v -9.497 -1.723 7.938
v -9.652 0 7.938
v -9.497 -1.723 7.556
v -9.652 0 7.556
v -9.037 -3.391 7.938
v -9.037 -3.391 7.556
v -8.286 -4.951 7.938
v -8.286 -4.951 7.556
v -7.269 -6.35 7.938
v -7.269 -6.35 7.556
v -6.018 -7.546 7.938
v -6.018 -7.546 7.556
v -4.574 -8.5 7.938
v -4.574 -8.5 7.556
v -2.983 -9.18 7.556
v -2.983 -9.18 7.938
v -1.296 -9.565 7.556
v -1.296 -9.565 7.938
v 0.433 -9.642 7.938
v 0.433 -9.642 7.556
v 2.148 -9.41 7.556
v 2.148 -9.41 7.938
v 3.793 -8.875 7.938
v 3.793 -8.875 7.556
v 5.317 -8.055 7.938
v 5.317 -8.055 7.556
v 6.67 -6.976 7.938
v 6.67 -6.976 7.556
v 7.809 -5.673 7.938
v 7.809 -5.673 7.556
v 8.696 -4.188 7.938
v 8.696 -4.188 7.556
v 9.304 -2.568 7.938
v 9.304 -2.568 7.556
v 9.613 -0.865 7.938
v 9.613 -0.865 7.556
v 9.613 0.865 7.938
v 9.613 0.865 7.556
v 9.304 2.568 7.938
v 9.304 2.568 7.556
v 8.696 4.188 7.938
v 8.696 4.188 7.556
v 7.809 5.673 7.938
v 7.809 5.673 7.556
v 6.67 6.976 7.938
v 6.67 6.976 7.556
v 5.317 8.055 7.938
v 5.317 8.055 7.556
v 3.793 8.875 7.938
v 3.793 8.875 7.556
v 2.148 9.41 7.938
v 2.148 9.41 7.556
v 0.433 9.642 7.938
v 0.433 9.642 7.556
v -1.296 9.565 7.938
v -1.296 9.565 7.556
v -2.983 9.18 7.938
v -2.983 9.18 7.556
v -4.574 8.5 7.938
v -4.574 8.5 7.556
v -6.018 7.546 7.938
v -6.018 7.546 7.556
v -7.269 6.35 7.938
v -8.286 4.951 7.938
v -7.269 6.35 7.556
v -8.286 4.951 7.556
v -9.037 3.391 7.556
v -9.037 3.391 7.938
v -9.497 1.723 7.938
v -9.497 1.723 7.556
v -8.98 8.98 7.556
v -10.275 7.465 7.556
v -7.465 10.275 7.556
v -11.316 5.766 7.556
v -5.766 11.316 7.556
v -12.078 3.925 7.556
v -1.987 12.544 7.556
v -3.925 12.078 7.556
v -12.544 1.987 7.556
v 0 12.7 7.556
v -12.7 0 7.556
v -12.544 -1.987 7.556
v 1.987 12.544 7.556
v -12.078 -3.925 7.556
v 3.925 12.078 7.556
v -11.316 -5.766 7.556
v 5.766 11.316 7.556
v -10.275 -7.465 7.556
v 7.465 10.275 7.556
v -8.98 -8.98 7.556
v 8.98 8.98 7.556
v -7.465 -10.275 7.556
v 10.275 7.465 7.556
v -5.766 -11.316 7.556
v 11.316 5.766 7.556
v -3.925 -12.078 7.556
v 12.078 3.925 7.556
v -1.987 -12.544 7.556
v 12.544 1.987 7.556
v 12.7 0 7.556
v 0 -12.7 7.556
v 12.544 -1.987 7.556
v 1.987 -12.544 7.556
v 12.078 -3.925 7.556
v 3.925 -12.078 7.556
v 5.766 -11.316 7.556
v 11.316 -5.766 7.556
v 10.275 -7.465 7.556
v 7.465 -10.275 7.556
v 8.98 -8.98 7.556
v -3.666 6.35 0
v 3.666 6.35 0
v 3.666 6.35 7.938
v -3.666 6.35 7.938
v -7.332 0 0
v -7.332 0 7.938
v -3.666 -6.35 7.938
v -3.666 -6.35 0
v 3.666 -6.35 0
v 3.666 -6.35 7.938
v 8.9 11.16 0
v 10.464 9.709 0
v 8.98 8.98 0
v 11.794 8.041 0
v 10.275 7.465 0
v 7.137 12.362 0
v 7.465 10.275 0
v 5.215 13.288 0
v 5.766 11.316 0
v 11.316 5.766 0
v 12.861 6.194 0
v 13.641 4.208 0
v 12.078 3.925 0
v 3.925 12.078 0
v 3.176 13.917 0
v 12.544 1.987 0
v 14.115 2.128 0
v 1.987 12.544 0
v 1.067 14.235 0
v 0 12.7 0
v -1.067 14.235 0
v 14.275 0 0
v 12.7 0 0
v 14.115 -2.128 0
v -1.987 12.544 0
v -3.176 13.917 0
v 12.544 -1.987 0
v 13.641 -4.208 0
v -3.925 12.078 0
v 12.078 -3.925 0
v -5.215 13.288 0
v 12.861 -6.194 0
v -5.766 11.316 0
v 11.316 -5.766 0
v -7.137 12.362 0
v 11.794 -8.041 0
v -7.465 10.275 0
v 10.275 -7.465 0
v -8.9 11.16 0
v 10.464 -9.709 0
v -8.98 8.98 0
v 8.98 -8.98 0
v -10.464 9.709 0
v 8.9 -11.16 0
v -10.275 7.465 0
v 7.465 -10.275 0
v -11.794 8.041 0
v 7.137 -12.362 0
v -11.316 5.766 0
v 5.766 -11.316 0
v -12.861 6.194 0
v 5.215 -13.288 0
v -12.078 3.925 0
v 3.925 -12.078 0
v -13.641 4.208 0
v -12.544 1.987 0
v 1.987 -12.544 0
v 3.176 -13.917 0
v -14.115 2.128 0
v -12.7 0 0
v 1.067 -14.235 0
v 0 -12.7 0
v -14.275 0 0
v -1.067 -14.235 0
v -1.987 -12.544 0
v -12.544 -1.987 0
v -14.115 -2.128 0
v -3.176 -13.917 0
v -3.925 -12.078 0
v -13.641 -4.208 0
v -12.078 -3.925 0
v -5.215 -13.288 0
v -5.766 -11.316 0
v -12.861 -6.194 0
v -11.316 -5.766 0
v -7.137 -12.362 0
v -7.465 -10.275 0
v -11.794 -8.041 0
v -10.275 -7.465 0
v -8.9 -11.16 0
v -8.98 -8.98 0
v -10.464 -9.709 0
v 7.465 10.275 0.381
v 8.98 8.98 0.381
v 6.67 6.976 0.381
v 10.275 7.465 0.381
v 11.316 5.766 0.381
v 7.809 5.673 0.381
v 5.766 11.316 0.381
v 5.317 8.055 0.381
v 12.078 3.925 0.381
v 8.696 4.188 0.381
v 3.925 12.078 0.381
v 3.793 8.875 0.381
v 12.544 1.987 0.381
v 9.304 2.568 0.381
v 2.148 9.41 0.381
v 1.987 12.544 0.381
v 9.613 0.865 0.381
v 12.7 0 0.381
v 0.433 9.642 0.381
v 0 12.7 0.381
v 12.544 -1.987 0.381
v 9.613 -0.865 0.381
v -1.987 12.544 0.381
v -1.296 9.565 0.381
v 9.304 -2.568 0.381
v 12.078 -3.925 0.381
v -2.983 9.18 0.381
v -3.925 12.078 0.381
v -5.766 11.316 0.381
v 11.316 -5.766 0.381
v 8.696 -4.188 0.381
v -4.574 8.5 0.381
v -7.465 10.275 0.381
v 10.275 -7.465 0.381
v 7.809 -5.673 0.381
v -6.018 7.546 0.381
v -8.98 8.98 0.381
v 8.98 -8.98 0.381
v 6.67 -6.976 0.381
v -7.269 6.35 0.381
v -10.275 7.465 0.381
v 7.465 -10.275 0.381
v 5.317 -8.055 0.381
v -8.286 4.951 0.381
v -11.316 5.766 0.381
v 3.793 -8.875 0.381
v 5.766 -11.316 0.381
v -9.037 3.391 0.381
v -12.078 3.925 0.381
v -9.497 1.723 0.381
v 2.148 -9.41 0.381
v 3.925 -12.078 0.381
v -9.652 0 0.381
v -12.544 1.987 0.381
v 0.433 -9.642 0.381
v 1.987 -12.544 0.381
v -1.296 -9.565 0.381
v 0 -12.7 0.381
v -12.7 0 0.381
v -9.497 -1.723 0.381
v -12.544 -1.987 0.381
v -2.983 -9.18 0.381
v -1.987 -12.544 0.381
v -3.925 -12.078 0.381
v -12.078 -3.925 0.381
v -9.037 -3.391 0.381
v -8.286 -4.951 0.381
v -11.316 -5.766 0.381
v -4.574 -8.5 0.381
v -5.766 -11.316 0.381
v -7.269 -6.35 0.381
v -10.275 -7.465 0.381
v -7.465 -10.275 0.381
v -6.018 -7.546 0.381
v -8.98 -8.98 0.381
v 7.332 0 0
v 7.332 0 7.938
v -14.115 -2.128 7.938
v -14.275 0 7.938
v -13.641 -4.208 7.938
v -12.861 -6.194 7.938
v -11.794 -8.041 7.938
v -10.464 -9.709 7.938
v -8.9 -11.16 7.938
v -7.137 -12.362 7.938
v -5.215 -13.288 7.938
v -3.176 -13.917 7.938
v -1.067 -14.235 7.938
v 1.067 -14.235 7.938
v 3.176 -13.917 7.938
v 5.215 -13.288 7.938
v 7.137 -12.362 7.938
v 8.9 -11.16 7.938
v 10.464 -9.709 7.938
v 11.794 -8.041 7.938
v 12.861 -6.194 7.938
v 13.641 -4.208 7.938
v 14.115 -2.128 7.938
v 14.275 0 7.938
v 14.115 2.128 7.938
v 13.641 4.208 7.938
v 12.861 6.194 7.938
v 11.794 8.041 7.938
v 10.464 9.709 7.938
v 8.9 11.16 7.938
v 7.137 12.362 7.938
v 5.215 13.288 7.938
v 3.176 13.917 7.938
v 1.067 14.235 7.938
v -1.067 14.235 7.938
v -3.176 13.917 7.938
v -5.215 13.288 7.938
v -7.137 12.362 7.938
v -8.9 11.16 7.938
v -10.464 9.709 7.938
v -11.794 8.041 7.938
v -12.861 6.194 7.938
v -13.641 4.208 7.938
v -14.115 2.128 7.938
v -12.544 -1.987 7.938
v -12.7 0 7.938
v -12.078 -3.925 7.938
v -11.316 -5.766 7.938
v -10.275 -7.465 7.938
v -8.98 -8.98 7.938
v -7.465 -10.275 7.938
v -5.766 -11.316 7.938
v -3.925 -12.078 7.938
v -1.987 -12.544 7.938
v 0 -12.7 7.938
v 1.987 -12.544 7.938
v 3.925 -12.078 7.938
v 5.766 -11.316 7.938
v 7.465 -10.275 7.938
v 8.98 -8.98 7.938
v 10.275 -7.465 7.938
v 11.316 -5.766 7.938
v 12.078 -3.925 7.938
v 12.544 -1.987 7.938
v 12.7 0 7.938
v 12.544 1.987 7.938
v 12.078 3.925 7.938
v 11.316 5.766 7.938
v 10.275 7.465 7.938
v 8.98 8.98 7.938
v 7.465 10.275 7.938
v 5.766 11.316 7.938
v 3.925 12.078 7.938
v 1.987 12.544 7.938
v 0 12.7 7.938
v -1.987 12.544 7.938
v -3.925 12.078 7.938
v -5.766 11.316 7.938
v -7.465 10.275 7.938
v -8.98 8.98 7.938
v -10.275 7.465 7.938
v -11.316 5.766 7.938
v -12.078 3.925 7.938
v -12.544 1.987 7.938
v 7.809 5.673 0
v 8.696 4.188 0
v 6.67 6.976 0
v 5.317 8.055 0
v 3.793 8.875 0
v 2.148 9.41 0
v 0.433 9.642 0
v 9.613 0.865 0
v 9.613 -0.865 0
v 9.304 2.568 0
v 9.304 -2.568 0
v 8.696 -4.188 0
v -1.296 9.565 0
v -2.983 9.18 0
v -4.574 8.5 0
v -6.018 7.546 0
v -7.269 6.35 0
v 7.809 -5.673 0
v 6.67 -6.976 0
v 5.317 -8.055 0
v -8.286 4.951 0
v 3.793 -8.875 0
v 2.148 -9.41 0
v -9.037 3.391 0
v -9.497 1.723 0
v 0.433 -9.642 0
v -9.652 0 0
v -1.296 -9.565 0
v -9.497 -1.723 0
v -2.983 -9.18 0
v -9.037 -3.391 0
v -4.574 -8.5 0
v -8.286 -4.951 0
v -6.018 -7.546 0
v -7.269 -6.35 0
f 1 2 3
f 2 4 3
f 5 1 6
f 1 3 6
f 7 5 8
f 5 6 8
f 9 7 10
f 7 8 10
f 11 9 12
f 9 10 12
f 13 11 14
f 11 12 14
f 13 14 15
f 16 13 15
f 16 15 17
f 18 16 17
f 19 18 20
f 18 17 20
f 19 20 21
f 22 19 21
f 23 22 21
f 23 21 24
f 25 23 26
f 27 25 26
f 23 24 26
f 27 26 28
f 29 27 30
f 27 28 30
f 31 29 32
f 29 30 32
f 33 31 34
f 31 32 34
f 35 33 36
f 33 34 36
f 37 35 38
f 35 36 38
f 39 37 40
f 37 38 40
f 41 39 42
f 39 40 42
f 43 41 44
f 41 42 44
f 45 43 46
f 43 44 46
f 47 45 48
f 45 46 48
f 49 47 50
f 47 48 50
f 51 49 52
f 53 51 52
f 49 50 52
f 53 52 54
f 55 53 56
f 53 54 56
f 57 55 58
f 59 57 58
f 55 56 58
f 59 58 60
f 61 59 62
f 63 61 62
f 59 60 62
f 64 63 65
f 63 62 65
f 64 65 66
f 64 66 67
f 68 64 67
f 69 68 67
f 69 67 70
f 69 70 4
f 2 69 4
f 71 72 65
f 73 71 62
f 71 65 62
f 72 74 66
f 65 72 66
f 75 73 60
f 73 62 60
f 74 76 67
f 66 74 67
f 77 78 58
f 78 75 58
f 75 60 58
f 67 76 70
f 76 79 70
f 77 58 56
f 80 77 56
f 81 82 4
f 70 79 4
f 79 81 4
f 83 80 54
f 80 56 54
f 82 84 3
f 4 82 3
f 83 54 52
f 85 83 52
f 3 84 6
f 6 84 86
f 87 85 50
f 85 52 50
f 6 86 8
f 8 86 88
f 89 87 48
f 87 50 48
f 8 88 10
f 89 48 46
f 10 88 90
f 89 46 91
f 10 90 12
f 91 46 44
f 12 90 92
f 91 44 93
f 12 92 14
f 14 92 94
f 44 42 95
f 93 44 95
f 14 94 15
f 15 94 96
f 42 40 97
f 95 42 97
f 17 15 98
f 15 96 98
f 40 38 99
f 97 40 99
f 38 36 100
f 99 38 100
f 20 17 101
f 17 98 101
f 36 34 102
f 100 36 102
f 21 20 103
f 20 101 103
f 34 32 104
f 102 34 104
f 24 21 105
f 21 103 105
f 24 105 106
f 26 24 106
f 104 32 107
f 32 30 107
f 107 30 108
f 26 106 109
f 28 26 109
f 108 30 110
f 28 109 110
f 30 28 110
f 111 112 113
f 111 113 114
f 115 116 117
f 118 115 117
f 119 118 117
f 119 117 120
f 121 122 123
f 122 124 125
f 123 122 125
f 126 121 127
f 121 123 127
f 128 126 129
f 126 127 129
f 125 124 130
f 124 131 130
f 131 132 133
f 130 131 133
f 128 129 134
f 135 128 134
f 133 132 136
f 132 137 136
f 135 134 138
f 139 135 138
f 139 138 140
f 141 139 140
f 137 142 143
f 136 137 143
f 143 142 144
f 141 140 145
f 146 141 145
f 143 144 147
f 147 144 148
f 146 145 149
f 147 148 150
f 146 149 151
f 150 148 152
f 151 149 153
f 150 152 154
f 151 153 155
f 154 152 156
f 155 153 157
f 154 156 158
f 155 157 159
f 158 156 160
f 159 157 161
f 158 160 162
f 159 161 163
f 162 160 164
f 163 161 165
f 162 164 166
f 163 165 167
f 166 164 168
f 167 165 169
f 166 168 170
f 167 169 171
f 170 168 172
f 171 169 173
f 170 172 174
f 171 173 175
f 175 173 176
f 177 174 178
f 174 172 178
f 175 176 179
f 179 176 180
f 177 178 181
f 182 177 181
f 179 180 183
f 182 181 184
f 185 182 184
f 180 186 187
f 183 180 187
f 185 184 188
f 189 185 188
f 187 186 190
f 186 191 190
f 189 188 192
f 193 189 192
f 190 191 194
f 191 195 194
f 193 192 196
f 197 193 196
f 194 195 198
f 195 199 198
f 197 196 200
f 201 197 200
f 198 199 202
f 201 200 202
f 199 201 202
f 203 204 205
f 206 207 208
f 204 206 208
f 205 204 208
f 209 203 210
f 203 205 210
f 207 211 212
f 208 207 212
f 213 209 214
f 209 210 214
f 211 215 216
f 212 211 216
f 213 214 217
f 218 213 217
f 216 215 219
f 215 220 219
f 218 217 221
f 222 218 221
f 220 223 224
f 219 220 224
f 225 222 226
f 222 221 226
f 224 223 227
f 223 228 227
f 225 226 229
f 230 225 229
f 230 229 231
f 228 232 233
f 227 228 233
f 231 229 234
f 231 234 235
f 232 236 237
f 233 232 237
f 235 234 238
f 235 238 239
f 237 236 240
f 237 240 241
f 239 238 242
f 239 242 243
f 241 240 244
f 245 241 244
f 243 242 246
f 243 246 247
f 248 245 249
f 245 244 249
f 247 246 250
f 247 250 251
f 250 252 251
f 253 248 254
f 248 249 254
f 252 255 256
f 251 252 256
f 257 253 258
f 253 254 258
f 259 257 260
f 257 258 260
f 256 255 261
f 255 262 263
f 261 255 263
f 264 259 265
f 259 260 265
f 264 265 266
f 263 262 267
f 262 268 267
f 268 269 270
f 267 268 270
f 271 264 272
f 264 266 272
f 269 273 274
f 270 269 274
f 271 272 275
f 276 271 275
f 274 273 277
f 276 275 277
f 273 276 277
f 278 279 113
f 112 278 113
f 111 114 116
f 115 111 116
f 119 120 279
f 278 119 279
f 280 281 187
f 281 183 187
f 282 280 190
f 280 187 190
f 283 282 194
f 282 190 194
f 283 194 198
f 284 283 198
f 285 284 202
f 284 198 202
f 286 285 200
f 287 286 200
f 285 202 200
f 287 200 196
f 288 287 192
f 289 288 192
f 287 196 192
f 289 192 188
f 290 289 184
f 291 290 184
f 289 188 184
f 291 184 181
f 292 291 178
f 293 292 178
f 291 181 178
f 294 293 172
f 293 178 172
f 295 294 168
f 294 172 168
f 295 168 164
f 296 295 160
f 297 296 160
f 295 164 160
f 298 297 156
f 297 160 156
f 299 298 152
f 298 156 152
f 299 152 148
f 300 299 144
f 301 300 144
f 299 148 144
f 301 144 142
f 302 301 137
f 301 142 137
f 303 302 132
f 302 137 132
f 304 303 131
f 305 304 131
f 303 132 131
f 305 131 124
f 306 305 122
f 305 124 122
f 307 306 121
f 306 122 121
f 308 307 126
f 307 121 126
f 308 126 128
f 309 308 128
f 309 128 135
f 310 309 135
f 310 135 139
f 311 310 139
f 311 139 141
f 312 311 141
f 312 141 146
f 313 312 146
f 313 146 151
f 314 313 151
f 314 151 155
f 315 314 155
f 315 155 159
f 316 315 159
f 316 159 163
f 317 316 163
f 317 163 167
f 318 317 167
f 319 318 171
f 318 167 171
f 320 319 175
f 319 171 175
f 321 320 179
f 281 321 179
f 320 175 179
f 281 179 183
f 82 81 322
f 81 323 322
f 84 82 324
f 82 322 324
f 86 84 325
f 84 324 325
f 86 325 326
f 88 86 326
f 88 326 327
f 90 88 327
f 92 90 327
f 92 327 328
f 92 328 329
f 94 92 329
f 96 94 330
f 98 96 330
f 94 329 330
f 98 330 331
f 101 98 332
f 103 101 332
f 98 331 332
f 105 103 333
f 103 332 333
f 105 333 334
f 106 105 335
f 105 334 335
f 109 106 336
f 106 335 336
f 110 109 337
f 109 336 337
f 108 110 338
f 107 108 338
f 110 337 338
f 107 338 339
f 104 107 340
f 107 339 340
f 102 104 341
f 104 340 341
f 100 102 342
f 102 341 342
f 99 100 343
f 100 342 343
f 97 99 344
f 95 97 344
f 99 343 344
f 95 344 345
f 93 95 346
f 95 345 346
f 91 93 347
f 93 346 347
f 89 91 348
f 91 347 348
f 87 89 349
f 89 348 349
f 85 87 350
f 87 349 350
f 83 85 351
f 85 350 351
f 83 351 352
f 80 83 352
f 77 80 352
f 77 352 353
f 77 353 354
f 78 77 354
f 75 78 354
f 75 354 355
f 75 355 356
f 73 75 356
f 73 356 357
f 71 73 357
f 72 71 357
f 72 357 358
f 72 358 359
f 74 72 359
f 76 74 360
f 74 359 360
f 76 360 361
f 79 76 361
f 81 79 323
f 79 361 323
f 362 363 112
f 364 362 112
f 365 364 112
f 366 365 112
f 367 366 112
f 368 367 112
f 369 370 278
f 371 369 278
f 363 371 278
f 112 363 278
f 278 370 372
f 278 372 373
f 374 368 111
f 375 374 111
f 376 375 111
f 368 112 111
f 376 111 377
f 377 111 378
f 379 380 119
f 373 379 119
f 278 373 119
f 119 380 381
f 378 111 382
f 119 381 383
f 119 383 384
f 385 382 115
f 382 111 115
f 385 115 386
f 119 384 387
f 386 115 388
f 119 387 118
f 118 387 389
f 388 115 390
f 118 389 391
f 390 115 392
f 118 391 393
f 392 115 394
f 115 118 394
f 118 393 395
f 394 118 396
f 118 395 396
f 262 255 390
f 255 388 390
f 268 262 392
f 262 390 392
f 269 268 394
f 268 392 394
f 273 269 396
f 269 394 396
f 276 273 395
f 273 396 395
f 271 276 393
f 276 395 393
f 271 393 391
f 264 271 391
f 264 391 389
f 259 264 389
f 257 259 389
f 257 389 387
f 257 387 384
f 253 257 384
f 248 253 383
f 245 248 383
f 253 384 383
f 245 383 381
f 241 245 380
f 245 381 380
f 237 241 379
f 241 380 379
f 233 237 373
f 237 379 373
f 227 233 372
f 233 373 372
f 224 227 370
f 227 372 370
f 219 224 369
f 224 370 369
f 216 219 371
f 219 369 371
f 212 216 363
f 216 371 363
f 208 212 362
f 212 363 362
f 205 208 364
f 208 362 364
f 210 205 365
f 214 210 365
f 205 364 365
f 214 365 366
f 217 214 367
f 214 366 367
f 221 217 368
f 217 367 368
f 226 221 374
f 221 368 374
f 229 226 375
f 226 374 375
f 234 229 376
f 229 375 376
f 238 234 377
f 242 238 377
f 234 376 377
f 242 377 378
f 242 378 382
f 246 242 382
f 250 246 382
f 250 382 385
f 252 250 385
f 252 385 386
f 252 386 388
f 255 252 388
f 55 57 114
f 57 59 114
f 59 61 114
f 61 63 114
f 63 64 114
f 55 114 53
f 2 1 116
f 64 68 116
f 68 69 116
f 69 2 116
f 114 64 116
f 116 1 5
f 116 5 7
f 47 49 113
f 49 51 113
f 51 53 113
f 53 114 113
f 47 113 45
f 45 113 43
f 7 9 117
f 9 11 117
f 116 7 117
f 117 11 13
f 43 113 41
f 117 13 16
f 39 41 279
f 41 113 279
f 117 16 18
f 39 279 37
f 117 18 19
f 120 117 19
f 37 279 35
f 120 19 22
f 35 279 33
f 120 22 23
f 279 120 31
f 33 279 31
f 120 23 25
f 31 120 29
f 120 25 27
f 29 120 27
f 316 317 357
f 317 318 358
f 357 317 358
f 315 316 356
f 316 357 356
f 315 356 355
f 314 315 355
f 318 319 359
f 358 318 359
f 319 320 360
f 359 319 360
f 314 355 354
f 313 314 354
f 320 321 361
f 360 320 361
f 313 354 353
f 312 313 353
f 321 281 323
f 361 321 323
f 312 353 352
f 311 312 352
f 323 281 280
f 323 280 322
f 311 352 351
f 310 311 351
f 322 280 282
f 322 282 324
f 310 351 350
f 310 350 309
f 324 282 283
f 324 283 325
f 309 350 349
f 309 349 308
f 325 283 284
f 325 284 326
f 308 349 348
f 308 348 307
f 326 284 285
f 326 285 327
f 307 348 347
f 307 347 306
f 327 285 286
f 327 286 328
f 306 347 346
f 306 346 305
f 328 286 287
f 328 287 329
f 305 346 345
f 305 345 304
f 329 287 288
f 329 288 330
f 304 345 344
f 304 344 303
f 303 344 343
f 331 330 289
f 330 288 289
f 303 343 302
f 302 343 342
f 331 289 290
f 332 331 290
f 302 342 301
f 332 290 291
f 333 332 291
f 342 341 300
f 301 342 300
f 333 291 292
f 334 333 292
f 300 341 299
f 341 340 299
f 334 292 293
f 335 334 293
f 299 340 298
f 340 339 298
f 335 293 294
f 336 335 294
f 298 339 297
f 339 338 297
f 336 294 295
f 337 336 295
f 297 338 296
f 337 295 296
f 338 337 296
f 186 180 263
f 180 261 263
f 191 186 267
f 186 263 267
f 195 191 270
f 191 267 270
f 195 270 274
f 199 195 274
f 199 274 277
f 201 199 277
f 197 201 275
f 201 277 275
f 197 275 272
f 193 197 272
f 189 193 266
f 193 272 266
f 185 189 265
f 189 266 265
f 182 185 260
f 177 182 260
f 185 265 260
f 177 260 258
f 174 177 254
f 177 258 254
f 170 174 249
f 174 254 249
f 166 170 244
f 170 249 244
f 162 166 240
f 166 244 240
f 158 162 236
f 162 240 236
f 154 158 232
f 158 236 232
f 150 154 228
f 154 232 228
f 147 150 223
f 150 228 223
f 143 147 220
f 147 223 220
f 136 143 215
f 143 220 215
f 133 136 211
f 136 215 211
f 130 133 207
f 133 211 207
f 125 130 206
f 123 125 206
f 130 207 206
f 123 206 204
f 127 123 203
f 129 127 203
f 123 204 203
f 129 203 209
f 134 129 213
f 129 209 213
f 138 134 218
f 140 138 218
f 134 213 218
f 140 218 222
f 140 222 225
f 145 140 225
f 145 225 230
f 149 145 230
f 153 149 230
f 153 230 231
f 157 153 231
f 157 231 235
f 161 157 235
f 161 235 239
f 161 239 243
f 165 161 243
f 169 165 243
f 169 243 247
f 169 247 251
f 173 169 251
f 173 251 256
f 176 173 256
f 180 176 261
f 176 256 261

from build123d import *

# Parameters (mm, degrees)
CUT_EXTRUDE6_DEPTH      = 22.692020107
CUT_EXTRUDE6_DEPTH_BACK = 22.692020107


with BuildPart() as part:
    # Sketch11 → Revolve3 (revolve)
    with BuildSketch(Plane(origin=(0, 0, 0), x_dir=(1, 0, 0), z_dir=(0, 1, 0))):
        Polygon((14.2748, -7.9375), (14.2748, -2.4010112), (14.2748, 0), (12.7, 0), (12.7, -0.381), (9.652, -0.381), (9.652, 0), (0, 0), (0, -7.9375), (9.652, -7.9375), (9.652, -7.5565), (12.7, -7.5565), (12.7, -7.9375), align=None)
    revolve(axis=Axis((0, 0, 0.717728402), (0, 0, 1)))

    # Sketch12 → Cut-Extrude6 (cut, two sides: drawn at the far end of the back side and taken through both)
    with BuildSketch(Plane(origin=(0, 0, 0), x_dir=(-1, 0, 0), z_dir=(0, 0, 1)).offset(-CUT_EXTRUDE6_DEPTH_BACK)):
        Polygon((7.332348419, 0), (3.666174209, 6.35), (-3.666174209, 6.35), (-7.332348419, 0), (-3.666174209, -6.35), (3.666174209, -6.35), align=None)
    extrude(amount=CUT_EXTRUDE6_DEPTH + CUT_EXTRUDE6_DEPTH_BACK, mode=Mode.SUBTRACT)


solid = part.part
